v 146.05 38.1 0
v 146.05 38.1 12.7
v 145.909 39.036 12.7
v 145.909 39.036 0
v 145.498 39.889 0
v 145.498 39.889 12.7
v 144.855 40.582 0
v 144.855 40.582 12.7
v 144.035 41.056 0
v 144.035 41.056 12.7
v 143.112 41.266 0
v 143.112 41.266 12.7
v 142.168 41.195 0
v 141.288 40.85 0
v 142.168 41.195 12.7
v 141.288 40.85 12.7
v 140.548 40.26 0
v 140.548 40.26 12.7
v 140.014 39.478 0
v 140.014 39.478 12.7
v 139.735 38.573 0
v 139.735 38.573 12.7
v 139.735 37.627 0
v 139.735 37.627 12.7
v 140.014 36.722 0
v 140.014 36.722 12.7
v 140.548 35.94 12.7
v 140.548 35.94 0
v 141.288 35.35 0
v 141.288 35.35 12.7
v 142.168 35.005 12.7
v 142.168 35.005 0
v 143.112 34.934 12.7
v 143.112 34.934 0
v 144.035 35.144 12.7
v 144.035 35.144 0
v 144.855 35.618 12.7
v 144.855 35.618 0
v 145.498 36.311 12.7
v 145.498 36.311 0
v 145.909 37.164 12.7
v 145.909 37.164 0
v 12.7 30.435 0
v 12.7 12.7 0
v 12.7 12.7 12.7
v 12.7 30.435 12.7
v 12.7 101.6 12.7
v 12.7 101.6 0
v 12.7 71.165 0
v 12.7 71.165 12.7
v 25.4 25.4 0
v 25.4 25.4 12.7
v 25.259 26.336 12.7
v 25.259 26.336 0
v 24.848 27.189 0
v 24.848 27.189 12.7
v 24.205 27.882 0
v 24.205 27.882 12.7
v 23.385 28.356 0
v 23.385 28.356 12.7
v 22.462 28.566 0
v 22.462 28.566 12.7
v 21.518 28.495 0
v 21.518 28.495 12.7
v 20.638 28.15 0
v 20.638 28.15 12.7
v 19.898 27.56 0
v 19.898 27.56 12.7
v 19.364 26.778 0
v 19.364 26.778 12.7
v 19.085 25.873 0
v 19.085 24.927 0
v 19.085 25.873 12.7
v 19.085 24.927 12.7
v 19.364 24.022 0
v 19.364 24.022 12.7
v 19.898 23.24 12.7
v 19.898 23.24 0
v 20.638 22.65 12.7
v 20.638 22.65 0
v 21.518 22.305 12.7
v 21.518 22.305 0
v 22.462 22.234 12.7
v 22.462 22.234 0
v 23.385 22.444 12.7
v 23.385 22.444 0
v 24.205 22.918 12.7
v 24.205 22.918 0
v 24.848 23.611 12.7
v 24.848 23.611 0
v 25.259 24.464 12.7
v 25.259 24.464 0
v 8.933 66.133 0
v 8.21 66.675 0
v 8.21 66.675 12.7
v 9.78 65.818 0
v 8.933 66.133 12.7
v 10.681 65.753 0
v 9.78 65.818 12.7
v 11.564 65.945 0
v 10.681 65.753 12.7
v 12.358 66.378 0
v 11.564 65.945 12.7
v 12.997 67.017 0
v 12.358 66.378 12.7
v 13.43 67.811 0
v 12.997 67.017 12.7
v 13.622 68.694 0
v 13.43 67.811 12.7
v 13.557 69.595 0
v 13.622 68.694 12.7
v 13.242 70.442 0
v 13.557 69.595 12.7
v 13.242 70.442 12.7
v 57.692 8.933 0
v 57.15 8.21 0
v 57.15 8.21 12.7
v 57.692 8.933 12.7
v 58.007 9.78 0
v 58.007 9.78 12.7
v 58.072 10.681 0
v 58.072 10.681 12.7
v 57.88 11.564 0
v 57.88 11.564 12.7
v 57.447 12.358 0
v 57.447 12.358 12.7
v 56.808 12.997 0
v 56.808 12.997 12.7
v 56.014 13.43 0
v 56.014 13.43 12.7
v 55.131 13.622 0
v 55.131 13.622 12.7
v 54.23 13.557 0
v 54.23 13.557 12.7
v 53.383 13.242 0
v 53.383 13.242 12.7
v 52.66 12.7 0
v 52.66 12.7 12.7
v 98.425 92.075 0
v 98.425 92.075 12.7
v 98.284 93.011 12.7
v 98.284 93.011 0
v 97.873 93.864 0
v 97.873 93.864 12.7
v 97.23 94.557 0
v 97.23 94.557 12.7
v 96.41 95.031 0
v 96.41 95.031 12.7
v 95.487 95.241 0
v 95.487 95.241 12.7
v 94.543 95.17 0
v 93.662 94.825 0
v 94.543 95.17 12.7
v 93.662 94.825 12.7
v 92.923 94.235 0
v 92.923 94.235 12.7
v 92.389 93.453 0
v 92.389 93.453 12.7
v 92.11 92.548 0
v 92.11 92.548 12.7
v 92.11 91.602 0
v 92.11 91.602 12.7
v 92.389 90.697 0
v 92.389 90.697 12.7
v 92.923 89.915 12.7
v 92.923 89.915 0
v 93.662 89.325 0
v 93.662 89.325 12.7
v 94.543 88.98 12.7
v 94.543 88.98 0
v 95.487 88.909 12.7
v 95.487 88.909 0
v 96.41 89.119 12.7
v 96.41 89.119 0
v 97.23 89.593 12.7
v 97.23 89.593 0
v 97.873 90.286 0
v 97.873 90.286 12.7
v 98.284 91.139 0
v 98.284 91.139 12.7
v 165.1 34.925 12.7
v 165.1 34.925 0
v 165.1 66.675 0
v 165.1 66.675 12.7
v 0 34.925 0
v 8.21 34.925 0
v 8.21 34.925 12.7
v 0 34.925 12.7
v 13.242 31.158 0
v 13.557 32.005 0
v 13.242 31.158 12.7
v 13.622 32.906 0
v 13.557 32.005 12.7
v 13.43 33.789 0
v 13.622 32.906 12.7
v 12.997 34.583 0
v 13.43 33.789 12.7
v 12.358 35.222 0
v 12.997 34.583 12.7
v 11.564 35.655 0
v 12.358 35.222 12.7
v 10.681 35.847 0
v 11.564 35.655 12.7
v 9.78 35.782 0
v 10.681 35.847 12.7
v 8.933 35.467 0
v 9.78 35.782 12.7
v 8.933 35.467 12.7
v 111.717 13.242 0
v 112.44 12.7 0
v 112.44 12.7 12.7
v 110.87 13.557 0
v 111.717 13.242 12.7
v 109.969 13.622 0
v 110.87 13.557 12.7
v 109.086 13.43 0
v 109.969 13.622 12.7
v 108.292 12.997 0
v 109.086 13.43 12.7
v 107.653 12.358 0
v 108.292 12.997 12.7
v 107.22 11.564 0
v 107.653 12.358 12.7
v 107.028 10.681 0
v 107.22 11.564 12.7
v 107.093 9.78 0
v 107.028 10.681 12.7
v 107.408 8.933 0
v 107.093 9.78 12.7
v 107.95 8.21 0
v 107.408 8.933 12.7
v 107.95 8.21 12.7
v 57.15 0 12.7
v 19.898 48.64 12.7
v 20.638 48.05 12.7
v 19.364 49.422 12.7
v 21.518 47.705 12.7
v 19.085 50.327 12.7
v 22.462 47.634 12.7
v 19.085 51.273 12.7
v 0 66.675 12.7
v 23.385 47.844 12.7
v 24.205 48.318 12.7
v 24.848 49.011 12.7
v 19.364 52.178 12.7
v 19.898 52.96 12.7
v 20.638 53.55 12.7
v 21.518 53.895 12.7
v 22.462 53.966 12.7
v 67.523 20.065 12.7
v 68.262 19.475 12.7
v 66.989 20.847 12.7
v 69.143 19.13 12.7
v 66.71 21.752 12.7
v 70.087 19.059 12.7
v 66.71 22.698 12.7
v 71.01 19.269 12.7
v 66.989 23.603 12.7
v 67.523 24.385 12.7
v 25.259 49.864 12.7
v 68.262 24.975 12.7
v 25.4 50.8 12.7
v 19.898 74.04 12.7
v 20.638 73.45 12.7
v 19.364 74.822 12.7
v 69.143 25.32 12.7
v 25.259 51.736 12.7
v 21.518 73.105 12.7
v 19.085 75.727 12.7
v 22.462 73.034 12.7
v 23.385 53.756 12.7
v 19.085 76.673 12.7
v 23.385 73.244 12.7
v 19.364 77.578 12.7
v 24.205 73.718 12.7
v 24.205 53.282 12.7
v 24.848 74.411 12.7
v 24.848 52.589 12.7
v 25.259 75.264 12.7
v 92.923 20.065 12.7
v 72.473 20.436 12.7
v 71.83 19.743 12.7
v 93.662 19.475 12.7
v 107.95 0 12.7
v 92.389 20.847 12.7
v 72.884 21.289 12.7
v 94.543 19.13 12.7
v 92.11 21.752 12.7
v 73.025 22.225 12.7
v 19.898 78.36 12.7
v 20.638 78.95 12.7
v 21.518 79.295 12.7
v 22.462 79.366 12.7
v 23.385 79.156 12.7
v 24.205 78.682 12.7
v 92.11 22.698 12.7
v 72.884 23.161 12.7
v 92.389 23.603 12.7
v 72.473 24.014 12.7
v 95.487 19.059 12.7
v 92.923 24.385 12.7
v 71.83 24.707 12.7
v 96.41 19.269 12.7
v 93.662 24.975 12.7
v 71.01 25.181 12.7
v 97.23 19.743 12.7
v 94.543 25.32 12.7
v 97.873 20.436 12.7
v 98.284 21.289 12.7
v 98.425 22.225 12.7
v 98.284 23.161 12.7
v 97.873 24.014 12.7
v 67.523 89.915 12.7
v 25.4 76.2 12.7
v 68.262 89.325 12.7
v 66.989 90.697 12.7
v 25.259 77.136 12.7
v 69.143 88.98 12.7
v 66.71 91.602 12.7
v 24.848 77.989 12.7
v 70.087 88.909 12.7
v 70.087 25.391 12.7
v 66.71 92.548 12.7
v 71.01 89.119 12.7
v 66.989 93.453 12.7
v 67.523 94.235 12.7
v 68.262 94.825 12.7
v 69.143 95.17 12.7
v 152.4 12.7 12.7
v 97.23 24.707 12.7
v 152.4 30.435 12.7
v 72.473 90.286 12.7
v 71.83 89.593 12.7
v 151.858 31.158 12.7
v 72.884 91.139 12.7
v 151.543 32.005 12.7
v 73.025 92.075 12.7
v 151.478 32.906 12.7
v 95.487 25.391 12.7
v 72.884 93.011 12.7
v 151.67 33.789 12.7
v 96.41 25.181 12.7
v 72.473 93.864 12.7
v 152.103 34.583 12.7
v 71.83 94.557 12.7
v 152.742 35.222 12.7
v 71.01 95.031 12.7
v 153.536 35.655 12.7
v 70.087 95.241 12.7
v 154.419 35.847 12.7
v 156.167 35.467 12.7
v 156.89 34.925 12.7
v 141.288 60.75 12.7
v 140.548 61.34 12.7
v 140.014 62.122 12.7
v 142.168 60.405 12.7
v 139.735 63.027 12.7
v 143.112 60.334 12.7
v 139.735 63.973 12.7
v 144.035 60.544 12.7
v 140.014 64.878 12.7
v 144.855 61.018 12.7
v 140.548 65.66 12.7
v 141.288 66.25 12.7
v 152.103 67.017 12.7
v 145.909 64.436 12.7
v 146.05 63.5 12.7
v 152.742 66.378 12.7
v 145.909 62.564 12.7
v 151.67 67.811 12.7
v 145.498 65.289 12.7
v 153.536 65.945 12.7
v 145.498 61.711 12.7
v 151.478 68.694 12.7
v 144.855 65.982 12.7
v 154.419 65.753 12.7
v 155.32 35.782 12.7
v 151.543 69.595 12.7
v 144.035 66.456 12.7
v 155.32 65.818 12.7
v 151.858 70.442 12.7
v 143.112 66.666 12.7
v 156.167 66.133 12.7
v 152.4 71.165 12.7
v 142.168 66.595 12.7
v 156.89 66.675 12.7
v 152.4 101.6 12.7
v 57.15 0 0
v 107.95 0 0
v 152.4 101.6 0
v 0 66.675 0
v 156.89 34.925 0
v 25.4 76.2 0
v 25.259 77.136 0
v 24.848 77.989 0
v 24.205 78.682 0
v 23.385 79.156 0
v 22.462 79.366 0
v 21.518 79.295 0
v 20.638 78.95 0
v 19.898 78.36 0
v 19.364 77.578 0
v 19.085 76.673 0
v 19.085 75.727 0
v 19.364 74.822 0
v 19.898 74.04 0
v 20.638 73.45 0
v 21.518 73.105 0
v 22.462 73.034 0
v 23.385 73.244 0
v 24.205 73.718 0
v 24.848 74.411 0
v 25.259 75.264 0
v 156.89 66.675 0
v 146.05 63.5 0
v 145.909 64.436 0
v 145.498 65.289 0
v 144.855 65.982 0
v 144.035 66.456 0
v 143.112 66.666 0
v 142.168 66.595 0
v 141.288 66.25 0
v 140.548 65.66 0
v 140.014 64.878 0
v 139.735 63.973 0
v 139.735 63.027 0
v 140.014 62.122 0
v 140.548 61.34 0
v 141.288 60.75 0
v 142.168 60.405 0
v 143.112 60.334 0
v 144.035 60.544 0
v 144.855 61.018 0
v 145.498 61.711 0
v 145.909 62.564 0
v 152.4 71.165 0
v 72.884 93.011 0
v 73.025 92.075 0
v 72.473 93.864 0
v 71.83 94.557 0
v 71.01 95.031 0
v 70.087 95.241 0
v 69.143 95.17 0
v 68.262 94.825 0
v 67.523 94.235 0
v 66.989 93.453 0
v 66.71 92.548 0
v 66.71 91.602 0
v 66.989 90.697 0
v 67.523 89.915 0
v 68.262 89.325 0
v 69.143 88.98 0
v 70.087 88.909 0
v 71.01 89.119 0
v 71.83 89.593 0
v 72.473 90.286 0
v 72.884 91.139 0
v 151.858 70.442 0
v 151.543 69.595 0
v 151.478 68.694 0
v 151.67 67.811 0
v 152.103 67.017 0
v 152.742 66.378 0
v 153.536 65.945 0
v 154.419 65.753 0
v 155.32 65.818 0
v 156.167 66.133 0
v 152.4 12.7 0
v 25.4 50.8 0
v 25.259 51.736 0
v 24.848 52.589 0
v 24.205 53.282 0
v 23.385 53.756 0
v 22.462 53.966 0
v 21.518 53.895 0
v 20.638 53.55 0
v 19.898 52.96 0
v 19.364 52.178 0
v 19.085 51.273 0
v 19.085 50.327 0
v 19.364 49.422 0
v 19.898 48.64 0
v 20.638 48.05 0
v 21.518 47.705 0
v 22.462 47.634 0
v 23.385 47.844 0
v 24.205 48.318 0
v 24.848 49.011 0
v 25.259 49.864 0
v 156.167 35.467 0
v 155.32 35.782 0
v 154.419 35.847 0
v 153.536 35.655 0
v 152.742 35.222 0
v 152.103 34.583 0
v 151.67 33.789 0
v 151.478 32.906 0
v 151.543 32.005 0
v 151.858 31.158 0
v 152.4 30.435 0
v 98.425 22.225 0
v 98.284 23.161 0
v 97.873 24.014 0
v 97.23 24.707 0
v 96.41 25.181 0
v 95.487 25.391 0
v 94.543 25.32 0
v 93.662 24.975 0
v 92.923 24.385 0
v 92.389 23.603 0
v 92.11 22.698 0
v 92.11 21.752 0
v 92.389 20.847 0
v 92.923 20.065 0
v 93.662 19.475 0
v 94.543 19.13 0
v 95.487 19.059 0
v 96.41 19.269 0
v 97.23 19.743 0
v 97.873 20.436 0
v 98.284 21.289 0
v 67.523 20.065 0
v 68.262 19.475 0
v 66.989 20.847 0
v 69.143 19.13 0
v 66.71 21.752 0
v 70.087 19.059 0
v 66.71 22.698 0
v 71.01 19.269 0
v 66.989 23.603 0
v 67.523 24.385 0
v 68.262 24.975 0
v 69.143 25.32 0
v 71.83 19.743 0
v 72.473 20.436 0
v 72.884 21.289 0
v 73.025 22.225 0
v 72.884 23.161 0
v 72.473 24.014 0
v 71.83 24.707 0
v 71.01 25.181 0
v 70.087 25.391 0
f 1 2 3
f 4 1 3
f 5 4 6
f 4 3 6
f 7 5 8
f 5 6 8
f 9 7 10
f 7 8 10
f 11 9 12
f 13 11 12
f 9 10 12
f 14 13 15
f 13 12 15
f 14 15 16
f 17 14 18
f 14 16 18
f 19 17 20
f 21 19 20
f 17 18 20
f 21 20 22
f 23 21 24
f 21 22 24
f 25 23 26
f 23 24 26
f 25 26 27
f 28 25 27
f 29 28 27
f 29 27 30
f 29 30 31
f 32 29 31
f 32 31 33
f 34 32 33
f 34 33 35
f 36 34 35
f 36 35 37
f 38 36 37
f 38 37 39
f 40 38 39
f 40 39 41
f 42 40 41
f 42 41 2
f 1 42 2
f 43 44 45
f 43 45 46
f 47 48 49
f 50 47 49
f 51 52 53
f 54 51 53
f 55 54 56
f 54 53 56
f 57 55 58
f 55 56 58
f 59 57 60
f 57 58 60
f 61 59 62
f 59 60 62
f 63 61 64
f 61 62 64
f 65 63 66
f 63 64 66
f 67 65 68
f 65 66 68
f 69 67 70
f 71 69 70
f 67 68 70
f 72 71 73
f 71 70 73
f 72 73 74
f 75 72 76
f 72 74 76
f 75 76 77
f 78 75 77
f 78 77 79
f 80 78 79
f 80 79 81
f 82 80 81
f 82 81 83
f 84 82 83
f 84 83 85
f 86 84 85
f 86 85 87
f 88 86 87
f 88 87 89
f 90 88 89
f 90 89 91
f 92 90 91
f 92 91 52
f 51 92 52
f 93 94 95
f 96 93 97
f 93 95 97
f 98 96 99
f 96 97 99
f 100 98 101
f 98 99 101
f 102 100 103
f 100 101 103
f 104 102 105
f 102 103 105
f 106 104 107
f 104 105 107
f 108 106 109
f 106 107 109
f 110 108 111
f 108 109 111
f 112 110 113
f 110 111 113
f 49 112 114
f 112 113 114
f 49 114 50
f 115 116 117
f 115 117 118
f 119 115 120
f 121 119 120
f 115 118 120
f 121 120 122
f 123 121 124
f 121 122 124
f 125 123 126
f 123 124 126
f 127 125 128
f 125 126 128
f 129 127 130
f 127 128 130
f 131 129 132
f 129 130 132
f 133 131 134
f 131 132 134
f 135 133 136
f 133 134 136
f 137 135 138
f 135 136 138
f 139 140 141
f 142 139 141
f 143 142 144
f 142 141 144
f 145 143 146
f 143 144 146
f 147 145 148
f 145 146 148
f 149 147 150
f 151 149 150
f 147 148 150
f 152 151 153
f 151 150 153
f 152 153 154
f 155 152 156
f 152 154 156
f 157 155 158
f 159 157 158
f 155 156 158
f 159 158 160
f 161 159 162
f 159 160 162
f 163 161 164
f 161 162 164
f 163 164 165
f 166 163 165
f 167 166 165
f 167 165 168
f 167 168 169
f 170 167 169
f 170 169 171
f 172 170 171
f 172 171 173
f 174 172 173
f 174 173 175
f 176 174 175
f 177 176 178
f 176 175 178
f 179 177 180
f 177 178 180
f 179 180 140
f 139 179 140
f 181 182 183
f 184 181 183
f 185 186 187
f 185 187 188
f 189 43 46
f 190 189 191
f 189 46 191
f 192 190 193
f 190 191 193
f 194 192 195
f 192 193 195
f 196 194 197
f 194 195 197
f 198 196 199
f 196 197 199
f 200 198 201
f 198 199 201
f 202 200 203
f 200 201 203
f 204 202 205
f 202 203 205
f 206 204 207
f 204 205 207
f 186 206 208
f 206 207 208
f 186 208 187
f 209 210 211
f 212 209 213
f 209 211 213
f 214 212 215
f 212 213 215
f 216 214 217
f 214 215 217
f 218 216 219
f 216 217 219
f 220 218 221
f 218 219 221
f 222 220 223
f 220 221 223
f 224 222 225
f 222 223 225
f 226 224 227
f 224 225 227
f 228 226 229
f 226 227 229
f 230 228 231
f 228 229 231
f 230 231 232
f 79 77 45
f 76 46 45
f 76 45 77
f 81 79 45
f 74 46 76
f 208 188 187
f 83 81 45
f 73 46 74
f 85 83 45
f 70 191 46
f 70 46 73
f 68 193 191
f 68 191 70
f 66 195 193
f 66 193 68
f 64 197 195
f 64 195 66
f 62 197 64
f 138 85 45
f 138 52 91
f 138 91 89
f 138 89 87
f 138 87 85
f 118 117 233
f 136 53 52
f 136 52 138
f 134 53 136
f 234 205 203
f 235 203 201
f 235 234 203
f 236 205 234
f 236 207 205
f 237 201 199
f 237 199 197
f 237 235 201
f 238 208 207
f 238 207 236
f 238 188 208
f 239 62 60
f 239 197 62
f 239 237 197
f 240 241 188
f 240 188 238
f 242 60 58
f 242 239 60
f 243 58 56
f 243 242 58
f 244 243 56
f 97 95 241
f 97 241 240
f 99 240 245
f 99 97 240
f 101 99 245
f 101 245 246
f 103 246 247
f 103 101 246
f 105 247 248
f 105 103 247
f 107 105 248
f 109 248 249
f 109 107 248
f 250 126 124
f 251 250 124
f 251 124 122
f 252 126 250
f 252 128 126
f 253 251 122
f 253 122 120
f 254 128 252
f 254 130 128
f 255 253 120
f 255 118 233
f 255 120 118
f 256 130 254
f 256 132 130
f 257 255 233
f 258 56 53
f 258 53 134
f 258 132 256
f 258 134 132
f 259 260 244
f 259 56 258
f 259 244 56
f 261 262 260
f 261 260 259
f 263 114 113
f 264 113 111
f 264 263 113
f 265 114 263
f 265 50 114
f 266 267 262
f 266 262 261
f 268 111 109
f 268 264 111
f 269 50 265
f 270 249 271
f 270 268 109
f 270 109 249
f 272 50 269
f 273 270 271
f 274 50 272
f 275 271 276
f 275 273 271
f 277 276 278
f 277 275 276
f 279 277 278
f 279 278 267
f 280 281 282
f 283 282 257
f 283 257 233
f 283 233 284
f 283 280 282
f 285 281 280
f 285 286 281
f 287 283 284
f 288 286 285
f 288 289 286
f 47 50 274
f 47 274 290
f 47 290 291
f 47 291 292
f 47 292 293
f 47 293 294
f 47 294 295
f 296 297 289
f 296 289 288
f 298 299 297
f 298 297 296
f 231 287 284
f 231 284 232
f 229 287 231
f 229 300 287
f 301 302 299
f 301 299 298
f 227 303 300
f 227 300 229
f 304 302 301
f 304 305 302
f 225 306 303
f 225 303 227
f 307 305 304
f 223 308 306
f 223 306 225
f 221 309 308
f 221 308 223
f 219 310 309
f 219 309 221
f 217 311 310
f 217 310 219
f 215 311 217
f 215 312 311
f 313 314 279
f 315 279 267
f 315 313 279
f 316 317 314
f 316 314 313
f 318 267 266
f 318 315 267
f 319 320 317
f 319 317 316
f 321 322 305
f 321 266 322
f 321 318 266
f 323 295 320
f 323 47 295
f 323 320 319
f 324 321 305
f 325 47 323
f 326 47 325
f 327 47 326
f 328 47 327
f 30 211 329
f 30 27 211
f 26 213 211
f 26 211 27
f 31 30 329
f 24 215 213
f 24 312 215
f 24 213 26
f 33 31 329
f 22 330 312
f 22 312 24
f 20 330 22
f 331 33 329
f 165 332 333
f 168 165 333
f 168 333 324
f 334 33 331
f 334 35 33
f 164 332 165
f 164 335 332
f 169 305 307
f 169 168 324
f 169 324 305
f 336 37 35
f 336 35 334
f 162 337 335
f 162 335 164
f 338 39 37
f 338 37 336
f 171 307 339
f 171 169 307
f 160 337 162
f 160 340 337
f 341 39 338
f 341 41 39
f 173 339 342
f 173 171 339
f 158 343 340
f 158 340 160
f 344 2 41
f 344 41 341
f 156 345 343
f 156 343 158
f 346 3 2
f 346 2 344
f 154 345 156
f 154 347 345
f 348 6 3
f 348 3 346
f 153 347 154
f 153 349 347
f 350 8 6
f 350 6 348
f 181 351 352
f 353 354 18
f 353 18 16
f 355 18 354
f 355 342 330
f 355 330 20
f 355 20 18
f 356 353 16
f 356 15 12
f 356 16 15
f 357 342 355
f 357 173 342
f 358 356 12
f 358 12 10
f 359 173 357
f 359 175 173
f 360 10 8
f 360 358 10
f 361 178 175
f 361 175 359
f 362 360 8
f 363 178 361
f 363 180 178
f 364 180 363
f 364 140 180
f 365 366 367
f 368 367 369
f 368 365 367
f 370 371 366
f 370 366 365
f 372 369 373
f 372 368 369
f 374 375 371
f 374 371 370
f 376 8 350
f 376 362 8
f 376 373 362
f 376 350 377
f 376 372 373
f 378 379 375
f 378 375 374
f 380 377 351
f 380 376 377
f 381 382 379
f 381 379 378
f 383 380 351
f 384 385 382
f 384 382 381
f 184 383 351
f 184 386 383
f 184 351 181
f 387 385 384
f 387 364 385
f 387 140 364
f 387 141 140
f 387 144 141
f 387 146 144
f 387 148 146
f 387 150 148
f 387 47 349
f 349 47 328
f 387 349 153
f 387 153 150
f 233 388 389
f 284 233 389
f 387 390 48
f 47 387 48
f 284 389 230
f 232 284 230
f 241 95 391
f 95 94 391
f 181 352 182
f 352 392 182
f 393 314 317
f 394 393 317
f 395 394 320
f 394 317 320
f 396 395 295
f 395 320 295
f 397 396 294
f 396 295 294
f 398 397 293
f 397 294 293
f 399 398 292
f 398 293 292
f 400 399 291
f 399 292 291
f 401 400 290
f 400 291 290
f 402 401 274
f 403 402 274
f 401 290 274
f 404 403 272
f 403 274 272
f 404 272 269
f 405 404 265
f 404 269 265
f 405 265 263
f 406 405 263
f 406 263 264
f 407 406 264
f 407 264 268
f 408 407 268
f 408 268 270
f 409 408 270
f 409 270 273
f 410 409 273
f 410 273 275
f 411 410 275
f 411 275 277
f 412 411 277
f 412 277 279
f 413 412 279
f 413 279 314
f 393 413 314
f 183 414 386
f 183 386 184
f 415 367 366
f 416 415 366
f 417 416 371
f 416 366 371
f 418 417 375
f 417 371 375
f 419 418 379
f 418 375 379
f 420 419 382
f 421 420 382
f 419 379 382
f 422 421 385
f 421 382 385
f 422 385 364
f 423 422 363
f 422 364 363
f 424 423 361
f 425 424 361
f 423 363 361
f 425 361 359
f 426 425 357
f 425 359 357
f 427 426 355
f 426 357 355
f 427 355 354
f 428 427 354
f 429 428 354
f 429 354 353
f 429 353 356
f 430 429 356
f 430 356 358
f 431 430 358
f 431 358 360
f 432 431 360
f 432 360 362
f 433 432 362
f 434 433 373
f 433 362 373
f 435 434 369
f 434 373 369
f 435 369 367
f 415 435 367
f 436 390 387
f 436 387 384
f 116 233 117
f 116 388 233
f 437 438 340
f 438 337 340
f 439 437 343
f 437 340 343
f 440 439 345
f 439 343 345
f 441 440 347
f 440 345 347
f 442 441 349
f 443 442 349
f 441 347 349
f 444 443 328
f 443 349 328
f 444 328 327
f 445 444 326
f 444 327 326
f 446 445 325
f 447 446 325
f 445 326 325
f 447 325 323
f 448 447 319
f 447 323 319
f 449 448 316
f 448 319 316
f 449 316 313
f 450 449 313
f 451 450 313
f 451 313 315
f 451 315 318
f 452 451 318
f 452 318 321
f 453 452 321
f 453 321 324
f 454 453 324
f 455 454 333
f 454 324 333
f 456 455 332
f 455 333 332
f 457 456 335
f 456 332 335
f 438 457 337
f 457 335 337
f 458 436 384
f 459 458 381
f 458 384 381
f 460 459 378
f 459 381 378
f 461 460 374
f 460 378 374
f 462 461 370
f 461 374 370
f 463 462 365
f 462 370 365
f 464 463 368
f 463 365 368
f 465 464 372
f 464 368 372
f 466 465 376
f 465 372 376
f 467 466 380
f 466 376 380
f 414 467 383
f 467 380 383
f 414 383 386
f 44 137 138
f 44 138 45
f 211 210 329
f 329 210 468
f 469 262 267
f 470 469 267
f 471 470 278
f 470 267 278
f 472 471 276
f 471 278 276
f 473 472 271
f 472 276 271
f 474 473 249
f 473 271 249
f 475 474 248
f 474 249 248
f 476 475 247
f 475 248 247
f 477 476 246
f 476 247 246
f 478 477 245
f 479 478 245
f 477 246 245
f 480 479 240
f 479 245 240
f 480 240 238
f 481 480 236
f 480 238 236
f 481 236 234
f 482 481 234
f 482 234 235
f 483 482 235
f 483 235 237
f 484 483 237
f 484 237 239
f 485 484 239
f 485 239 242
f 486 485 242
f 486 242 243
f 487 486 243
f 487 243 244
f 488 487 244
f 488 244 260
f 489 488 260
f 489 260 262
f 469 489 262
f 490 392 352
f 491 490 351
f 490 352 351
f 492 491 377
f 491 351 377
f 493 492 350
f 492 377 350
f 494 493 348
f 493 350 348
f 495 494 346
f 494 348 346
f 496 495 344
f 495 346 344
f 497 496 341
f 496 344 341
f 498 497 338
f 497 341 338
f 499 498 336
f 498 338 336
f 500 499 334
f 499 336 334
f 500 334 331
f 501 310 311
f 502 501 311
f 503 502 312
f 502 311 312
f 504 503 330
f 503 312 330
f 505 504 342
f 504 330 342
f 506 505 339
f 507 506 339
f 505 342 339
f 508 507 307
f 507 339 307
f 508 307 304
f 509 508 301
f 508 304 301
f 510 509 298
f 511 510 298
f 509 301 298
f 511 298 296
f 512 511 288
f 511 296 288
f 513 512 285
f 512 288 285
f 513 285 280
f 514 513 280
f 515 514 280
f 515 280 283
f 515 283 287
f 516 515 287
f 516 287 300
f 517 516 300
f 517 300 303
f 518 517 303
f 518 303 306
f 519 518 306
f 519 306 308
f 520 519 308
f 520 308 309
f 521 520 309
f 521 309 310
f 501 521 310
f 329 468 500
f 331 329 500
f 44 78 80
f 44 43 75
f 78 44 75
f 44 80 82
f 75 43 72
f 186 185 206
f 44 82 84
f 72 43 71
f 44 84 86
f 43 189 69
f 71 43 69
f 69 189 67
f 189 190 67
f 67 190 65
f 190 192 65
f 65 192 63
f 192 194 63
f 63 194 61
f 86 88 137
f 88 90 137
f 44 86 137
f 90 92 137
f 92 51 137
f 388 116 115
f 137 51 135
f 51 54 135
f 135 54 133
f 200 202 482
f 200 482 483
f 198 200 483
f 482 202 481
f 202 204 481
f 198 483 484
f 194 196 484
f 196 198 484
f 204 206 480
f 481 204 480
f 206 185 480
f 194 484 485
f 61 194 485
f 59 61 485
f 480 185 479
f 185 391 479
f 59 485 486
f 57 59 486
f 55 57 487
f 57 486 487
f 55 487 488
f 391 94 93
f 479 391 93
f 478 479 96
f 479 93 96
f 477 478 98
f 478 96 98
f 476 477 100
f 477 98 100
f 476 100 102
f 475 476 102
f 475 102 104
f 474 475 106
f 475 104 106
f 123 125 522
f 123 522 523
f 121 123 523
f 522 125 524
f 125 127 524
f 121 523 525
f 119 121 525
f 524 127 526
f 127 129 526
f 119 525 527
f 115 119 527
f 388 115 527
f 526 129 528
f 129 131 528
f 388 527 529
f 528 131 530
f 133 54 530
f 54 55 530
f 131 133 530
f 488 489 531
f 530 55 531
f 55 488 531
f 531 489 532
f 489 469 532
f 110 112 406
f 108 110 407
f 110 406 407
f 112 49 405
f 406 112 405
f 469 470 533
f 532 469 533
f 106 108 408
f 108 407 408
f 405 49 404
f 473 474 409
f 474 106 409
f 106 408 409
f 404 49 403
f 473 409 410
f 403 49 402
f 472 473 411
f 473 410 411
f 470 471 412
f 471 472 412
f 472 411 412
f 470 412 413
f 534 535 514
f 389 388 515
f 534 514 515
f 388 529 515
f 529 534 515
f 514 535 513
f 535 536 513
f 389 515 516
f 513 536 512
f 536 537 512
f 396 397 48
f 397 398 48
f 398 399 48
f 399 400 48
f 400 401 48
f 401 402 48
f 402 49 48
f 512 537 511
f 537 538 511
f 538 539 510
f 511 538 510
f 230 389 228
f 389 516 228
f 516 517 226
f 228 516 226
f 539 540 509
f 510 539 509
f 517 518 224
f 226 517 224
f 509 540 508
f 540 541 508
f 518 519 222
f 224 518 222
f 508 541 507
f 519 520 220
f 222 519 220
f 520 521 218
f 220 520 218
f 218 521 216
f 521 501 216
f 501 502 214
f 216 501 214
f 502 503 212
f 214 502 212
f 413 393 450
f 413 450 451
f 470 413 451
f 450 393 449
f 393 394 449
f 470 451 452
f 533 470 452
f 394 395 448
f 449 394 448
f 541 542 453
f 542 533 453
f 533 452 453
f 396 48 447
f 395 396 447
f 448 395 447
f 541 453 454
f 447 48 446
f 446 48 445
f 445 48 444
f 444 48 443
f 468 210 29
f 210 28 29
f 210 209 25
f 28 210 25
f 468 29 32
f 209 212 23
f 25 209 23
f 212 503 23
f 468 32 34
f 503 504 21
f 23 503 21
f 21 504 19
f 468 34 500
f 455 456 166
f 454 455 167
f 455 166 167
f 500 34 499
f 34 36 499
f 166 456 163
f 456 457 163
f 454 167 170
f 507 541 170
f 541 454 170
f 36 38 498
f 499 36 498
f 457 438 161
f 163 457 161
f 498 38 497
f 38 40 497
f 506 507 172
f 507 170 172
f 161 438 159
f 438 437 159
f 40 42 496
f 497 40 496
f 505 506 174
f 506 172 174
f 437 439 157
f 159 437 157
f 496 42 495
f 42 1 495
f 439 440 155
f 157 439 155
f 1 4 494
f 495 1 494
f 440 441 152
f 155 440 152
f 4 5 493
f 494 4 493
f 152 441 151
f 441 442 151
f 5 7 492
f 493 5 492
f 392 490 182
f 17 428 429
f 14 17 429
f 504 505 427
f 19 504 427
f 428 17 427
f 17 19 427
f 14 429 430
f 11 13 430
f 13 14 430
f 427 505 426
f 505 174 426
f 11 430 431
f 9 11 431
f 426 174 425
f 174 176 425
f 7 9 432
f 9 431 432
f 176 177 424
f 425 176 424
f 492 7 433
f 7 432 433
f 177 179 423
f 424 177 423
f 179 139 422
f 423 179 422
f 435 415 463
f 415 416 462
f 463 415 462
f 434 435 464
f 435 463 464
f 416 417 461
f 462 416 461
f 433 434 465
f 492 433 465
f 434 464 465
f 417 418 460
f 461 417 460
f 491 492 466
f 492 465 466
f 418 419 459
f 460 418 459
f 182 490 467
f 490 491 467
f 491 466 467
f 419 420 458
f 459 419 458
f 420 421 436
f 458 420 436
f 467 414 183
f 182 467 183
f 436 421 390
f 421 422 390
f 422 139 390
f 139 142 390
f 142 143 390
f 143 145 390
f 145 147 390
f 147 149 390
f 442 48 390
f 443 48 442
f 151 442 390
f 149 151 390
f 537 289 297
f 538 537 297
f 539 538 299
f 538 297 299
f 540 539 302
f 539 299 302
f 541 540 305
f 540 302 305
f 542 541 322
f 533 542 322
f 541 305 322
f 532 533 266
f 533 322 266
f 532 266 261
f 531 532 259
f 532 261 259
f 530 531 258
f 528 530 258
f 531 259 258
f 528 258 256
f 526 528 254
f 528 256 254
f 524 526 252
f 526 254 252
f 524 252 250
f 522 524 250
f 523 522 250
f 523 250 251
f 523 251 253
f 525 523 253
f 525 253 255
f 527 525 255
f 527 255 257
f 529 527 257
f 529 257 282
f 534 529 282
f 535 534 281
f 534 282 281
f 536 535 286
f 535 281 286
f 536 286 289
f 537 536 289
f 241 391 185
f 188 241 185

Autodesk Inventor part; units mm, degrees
ref_plane "YZ Plane" through (0, 0, 0) normal (1, 0, 0) x (0, 1, 0)
ref_plane "XZ Plane" through (0, 0, 0) normal (0, 1, 0) x (-1, 0, 0)
ref_plane "XY Plane" through (0, 0, 0) normal (0, 0, 1) x (1, 0, 0)
sketch "Sketch1" plane through (0, 0, 0) normal (0, 0, 1) x (1, 0, 0)
  line L0 (0, 0) -> (165.1, 0)
  line L1 (165.1, 0) -> (165.1, 101.6)
  line L2 (165.1, 101.6) -> (0, 101.6)
  line L3 (0, 101.6) -> (0, 0)
  line L4 (0, 0) -> (57.15, 0)
  line L5 (57.15, 0) -> (57.15, 12.7)
  line L6 (57.15, 12.7) -> (0, 12.7)
  line L7 (0, 12.7) -> (0, 0)
  line L8 (165.1, 0) -> (107.95, 0)
  line L9 (107.95, 0) -> (107.95, 12.7)
  line L10 (107.95, 12.7) -> (165.1, 12.7)
  line L11 (165.1, 12.7) -> (165.1, 0)
  line L12 (0, 12.7) -> (12.7, 12.7)
  line L13 (12.7, 12.7) -> (12.7, 34.925)
  line L14 (12.7, 34.925) -> (0, 34.925)
  line L15 (0, 34.925) -> (0, 12.7)
  line L16 (165.1, 12.7) -> (152.4, 12.7)
  line L17 (152.4, 12.7) -> (152.4, 34.925)
  line L18 (152.4, 34.925) -> (165.1, 34.925)
  line L19 (165.1, 34.925) -> (165.1, 12.7)
  line L20 (0, 101.6) -> (12.7, 101.6)
  line L21 (12.7, 101.6) -> (12.7, 66.675)
  line L22 (12.7, 66.675) -> (0, 66.675)
  line L23 (0, 66.675) -> (0, 101.6)
  line L24 (165.1, 101.6) -> (152.4, 101.6)
  line L25 (152.4, 101.6) -> (152.4, 66.675)
  line L26 (152.4, 66.675) -> (165.1, 66.675)
  line L27 (165.1, 66.675) -> (165.1, 101.6)
  point P0 (0, 66.675)
  point P1 (0, 34.925)
  dimension "d0" = 101.6
  dimension "d1" = 165.1
  dimension "d2" = 57.15
  dimension "d3" = 12.7
  dimension "d4" = 57.15
  dimension "d5" = 12.7
  dimension "d6" = 12.7
  dimension "d7" = 22.225
  dimension "d8" = 12.7
  dimension "d9" = 22.225
  dimension "d10" = 12.7
  dimension "d11" = 34.925
  dimension "d12" = 12.7
  dimension "d13" = 34.925
extrude "Extrusion1" add sketch "Sketch1" along normal blind 12.7 contours L5 L6 L13 L14 L3 L22 L21 L2 L25 L26 L1 L18 L17 L10 L9 L0
sketch "Sketch2" plane through (0, 0, 12.7) normal (0, 0, 1) x (1, 0, 0)
  line L0 (12.7, 66.675) -> (0, 66.675) projected
  line L1 (12.7, 66.675) -> (10.4549, 68.9201)
  line L2 (12.7, 101.6) -> (12.7, 66.675) projected
  line L3 (12.7, 34.925) -> (12.7, 12.7) projected
  line L4 (12.7, 34.925) -> (10.4549, 32.6799)
  line L5 (57.15, 12.7) -> (57.15, 0) projected
  line L6 (57.15, 12.7) -> (54.9049, 10.4549)
  line L7 (107.95, 0) -> (107.95, 12.7) projected
  line L8 (107.95, 12.7) -> (110.1951, 10.4549)
  line L9 (107.95, 12.7) -> (152.4, 12.7) projected
  line L10 (152.4, 12.7) -> (152.4, 34.925) projected
  line L11 (152.4, 34.925) -> (154.6451, 32.6799)
  line L12 (152.4, 34.925) -> (165.1, 34.925) projected
  line L13 (165.1, 66.675) -> (152.4, 66.675) projected
  line L14 (152.4, 66.675) -> (154.6451, 68.9201)
  circle A0 centre (10.4549, 68.9201) radius 3.175
  circle A1 centre (10.4549, 32.6799) radius 3.175
  circle A2 centre (54.9049, 10.4549) radius 3.175
  circle A3 centre (110.1951, 10.4549) radius 3.175
  circle A4 centre (154.6451, 32.6799) radius 3.175
  circle A5 centre (154.6451, 68.9201) radius 3.175
  point P0 (0, 0)
  dimension "d16" = 3.175
  dimension "d17" = 45
  dimension "d18" = 3.175
  dimension "d19" = 45
  dimension "d20" = 3.175
  dimension "d21" = 45
  dimension "d22" = 3.175
  dimension "d23" = 45
  dimension "d24" = 3.175
  dimension "d25" = 45
  dimension "d26" = 3.175
  dimension "d27" = 45
  dimension "d28" = 6.35
  dimension "d29" = 6.35
  dimension "d30" = 6.35
  dimension "d31" = 6.35
  dimension "d32" = 6.35
  dimension "d33" = 6.35
extrude "Extrusion2" cut sketch "Sketch2" against normal blind 12.7
sketch "Sketch4" plane through (0, 0, 12.7) normal (0, 0, 1) x (1, 0, 0)
  circle A0 centre (22.225, 82.55) radius 3.175
  circle A1 centre (22.225, 57.15) radius 3.175
  line L0 (12.7, 101.6) -> (12.7, 71.1651) projected
  circle A2 centre (22.225, 31.75) radius 3.175
  line L1 (12.7, 30.4349) -> (12.7, 12.7) projected
  line L2 (57.15, 0) -> (107.95, 0) projected
  circle A3 centre (142.875, 31.75) radius 3.175
  circle A4 centre (142.875, 57.15) radius 3.175
  circle A5 centre (142.875, 82.55) radius 3.175
  line L3 (152.4, 71.1651) -> (152.4, 101.6) projected
  line L4 (152.4, 12.7) -> (152.4, 30.4349) projected
  circle A6 centre (82.55, 22.225) radius 3.175
  line L5 (112.4401, 12.7) -> (152.4, 12.7) projected
  line L6 (57.15, 8.2099) -> (57.15, 0) projected
  circle A7 centre (57.15, 22.225) radius 3.175
  line L7 (12.7, 12.7) -> (52.6599, 12.7) projected
  circle A8 centre (107.95, 22.225) radius 3.175
  point P0 (0, 0)
  dimension "d63" = 6.35
  dimension "d64" = 6.35
  dimension "d65" = 9.525
  dimension "d66" = 9.525
  dimension "d67" = 6.35
  dimension "d68" = 9.525
  dimension "d69" = 31.75
  dimension "d70" = 25.4
  dimension "d71" = 25.4
  dimension "d72" = 6.35
  dimension "d73" = 6.35
  dimension "d74" = 6.35
  dimension "d75" = 9.525
  dimension "d76" = 9.525
  dimension "d77" = 9.525
  dimension "d78" = 31.75
  dimension "d79" = 25.4
  dimension "d80" = 25.4
  dimension "d81" = 6.35
  dimension "d82" = 9.525
  dimension "d83" = 25.4
  dimension "d84" = 6.35
  dimension "d85" = 9.525
  dimension "d86" = 25.4
  dimension "d87" = 6.35
  dimension "d88" = 25.4
  dimension "d89" = 9.525
extrude "Extrusion4" cut sketch "Sketch4" against normal blind 12.7
sketch "Sketch5" plane through (0, 0, 12.7) normal (0, 0, 1) x (1, 0, 0)
  circle A0 centre (22.225, 76.2) radius 3.175
  circle A1 centre (22.225, 82.55) radius 3.175 projected
  circle A2 centre (22.225, 50.8) radius 3.175
  circle A3 centre (22.225, 25.4) radius 3.175
  line L0 (12.7, 101.6) -> (12.7, 71.1651) projected
  point P0 (0, 0)
  dimension "d92" = 6.35
  dimension "d93" = 6.35
  dimension "d94" = 6.35
  dimension "d95" = 6.35
  dimension "d96" = 9.525
  dimension "d97" = 9.525
  dimension "d98" = 9.525
  dimension "d99" = 25.4
  dimension "d100" = 25.4
extrude "Extrusion5" cut sketch "Sketch5" against normal blind 12.7 contours A0 | A2 | A3
sketch "Sketch6" plane through (0, 0, 12.7) normal (0, 0, 1) x (1, 0, 0)
  circle A0 centre (22.225, 82.55) radius 3.175 projected
  circle A1 centre (22.225, 82.55) radius 3.175
  circle A2 centre (22.225, 57.15) radius 3.175 projected
  circle A3 centre (22.225, 57.15) radius 3.175
  circle A4 centre (22.225, 31.75) radius 3.175 projected
  circle A5 centre (22.225, 31.75) radius 3.175
  point P0 (0, 0)
  point P1 (22.225, 79.375)
  point P2 (22.225, 53.975)
  point P3 (22.225, 28.575)
  dimension "d103" = 6.35
  dimension "d104" = 6.35
  dimension "d105" = 6.35
extrude "Extrusion6" add sketch "Sketch6" against normal blind 12.7
sketch "Sketch8" plane through (0, 0, 12.7) normal (0, 0, 1) x (1, 0, 0)
  circle A0 centre (142.875, 82.55) radius 3.175 projected
  circle A1 centre (142.875, 82.55) radius 3.175
  circle A2 centre (142.875, 57.15) radius 3.175 projected
  circle A3 centre (142.875, 57.15) radius 3.175
  circle A4 centre (142.875, 31.75) radius 3.175 projected
  circle A5 centre (142.875, 31.75) radius 3.175
  point P0 (0, 0)
  dimension "d116" = 6.35
  dimension "d117" = 6.35
  dimension "d118" = 6.35
extrude "Extrusion8" add sketch "Sketch8" against normal blind 12.7
sketch "Sketch11" plane through (0, 0, 12.7) normal (0, 0, 1) x (1, 0, 0)
  circle A0 centre (69.85, 22.225) radius 3.175
  circle A1 centre (95.25, 22.225) radius 3.175
  line L0 (12.7, 12.7) -> (52.6599, 12.7) projected
  line L1 (112.4401, 12.7) -> (152.4, 12.7) projected
  line L2 (57.15, 8.2099) -> (57.15, 0) projected
  line L3 (107.95, 0) -> (107.95, 8.2099) projected
  point P0 (0, 0)
  dimension "d132" = 6.35
  dimension "d133" = 6.35
  dimension "d134" = 9.525
  dimension "d135" = 9.525
  dimension "d136" = 12.7
  dimension "d137" = 12.7
extrude "Extrusion10" cut sketch "Sketch11" against normal blind 12.7
sketch "Sketch12" plane through (0, 0, 12.7) normal (0, 0, 1) x (1, 0, 0)
  circle A0 centre (82.55, 22.225) radius 3.175 projected
  circle A1 centre (82.55, 22.225) radius 3.175
  circle A2 centre (57.15, 22.225) radius 3.175 projected
  circle A3 centre (57.15, 22.225) radius 3.175
  circle A4 centre (107.95, 22.225) radius 3.175 projected
  circle A5 centre (107.95, 22.225) radius 3.175
  point P0 (0, 0)
  dimension "d140" = 6.35
  dimension "d141" = 6.35
  dimension "d142" = 6.35
extrude "Extrusion11" add sketch "Sketch12" against normal blind 12.7
sketch "Sketch13" plane through (0, 0, 12.7) normal (0, 0, 1) x (1, 0, 0)
  circle A0 centre (69.85, 92.075) radius 3.175
  circle A1 centre (95.25, 92.075) radius 3.175
  line L0 (152.4, 101.6) -> (12.7, 101.6) projected
  line L1 (57.15, 8.2099) -> (57.15, 0) projected
  point P0 (0, 0)
  dimension "d145" = 6.35
  dimension "d146" = 6.35
  dimension "d147" = 9.525
  dimension "d148" = 9.525
  dimension "d149" = 25.4
  dimension "d150" = 12.7
extrude "Extrusion12" cut sketch "Sketch13" against normal blind 12.7
sketch "Sketch14" plane through (0, 0, 12.7) normal (0, 0, 1) x (1, 0, 0)
  line L0 (57.15, 0) -> (107.95, 0) projected
  line L1 (152.4, 12.7) -> (152.4, 30.4349) projected
  circle A0 centre (142.875, 38.1) radius 3.175
  circle A1 centre (142.875, 63.5) radius 3.175
  point P0 (0, 0)
  dimension "d156" = 6.35
  dimension "d158" = 6.35
  dimension "d160" = 9.525
  dimension "d161" = 9.525
  dimension "d162" = 25.4
  dimension "d165" = 38.1
extrude "Extrusion13" cut sketch "Sketch14" against normal blind 12.7
properties part number "Front Wall"
